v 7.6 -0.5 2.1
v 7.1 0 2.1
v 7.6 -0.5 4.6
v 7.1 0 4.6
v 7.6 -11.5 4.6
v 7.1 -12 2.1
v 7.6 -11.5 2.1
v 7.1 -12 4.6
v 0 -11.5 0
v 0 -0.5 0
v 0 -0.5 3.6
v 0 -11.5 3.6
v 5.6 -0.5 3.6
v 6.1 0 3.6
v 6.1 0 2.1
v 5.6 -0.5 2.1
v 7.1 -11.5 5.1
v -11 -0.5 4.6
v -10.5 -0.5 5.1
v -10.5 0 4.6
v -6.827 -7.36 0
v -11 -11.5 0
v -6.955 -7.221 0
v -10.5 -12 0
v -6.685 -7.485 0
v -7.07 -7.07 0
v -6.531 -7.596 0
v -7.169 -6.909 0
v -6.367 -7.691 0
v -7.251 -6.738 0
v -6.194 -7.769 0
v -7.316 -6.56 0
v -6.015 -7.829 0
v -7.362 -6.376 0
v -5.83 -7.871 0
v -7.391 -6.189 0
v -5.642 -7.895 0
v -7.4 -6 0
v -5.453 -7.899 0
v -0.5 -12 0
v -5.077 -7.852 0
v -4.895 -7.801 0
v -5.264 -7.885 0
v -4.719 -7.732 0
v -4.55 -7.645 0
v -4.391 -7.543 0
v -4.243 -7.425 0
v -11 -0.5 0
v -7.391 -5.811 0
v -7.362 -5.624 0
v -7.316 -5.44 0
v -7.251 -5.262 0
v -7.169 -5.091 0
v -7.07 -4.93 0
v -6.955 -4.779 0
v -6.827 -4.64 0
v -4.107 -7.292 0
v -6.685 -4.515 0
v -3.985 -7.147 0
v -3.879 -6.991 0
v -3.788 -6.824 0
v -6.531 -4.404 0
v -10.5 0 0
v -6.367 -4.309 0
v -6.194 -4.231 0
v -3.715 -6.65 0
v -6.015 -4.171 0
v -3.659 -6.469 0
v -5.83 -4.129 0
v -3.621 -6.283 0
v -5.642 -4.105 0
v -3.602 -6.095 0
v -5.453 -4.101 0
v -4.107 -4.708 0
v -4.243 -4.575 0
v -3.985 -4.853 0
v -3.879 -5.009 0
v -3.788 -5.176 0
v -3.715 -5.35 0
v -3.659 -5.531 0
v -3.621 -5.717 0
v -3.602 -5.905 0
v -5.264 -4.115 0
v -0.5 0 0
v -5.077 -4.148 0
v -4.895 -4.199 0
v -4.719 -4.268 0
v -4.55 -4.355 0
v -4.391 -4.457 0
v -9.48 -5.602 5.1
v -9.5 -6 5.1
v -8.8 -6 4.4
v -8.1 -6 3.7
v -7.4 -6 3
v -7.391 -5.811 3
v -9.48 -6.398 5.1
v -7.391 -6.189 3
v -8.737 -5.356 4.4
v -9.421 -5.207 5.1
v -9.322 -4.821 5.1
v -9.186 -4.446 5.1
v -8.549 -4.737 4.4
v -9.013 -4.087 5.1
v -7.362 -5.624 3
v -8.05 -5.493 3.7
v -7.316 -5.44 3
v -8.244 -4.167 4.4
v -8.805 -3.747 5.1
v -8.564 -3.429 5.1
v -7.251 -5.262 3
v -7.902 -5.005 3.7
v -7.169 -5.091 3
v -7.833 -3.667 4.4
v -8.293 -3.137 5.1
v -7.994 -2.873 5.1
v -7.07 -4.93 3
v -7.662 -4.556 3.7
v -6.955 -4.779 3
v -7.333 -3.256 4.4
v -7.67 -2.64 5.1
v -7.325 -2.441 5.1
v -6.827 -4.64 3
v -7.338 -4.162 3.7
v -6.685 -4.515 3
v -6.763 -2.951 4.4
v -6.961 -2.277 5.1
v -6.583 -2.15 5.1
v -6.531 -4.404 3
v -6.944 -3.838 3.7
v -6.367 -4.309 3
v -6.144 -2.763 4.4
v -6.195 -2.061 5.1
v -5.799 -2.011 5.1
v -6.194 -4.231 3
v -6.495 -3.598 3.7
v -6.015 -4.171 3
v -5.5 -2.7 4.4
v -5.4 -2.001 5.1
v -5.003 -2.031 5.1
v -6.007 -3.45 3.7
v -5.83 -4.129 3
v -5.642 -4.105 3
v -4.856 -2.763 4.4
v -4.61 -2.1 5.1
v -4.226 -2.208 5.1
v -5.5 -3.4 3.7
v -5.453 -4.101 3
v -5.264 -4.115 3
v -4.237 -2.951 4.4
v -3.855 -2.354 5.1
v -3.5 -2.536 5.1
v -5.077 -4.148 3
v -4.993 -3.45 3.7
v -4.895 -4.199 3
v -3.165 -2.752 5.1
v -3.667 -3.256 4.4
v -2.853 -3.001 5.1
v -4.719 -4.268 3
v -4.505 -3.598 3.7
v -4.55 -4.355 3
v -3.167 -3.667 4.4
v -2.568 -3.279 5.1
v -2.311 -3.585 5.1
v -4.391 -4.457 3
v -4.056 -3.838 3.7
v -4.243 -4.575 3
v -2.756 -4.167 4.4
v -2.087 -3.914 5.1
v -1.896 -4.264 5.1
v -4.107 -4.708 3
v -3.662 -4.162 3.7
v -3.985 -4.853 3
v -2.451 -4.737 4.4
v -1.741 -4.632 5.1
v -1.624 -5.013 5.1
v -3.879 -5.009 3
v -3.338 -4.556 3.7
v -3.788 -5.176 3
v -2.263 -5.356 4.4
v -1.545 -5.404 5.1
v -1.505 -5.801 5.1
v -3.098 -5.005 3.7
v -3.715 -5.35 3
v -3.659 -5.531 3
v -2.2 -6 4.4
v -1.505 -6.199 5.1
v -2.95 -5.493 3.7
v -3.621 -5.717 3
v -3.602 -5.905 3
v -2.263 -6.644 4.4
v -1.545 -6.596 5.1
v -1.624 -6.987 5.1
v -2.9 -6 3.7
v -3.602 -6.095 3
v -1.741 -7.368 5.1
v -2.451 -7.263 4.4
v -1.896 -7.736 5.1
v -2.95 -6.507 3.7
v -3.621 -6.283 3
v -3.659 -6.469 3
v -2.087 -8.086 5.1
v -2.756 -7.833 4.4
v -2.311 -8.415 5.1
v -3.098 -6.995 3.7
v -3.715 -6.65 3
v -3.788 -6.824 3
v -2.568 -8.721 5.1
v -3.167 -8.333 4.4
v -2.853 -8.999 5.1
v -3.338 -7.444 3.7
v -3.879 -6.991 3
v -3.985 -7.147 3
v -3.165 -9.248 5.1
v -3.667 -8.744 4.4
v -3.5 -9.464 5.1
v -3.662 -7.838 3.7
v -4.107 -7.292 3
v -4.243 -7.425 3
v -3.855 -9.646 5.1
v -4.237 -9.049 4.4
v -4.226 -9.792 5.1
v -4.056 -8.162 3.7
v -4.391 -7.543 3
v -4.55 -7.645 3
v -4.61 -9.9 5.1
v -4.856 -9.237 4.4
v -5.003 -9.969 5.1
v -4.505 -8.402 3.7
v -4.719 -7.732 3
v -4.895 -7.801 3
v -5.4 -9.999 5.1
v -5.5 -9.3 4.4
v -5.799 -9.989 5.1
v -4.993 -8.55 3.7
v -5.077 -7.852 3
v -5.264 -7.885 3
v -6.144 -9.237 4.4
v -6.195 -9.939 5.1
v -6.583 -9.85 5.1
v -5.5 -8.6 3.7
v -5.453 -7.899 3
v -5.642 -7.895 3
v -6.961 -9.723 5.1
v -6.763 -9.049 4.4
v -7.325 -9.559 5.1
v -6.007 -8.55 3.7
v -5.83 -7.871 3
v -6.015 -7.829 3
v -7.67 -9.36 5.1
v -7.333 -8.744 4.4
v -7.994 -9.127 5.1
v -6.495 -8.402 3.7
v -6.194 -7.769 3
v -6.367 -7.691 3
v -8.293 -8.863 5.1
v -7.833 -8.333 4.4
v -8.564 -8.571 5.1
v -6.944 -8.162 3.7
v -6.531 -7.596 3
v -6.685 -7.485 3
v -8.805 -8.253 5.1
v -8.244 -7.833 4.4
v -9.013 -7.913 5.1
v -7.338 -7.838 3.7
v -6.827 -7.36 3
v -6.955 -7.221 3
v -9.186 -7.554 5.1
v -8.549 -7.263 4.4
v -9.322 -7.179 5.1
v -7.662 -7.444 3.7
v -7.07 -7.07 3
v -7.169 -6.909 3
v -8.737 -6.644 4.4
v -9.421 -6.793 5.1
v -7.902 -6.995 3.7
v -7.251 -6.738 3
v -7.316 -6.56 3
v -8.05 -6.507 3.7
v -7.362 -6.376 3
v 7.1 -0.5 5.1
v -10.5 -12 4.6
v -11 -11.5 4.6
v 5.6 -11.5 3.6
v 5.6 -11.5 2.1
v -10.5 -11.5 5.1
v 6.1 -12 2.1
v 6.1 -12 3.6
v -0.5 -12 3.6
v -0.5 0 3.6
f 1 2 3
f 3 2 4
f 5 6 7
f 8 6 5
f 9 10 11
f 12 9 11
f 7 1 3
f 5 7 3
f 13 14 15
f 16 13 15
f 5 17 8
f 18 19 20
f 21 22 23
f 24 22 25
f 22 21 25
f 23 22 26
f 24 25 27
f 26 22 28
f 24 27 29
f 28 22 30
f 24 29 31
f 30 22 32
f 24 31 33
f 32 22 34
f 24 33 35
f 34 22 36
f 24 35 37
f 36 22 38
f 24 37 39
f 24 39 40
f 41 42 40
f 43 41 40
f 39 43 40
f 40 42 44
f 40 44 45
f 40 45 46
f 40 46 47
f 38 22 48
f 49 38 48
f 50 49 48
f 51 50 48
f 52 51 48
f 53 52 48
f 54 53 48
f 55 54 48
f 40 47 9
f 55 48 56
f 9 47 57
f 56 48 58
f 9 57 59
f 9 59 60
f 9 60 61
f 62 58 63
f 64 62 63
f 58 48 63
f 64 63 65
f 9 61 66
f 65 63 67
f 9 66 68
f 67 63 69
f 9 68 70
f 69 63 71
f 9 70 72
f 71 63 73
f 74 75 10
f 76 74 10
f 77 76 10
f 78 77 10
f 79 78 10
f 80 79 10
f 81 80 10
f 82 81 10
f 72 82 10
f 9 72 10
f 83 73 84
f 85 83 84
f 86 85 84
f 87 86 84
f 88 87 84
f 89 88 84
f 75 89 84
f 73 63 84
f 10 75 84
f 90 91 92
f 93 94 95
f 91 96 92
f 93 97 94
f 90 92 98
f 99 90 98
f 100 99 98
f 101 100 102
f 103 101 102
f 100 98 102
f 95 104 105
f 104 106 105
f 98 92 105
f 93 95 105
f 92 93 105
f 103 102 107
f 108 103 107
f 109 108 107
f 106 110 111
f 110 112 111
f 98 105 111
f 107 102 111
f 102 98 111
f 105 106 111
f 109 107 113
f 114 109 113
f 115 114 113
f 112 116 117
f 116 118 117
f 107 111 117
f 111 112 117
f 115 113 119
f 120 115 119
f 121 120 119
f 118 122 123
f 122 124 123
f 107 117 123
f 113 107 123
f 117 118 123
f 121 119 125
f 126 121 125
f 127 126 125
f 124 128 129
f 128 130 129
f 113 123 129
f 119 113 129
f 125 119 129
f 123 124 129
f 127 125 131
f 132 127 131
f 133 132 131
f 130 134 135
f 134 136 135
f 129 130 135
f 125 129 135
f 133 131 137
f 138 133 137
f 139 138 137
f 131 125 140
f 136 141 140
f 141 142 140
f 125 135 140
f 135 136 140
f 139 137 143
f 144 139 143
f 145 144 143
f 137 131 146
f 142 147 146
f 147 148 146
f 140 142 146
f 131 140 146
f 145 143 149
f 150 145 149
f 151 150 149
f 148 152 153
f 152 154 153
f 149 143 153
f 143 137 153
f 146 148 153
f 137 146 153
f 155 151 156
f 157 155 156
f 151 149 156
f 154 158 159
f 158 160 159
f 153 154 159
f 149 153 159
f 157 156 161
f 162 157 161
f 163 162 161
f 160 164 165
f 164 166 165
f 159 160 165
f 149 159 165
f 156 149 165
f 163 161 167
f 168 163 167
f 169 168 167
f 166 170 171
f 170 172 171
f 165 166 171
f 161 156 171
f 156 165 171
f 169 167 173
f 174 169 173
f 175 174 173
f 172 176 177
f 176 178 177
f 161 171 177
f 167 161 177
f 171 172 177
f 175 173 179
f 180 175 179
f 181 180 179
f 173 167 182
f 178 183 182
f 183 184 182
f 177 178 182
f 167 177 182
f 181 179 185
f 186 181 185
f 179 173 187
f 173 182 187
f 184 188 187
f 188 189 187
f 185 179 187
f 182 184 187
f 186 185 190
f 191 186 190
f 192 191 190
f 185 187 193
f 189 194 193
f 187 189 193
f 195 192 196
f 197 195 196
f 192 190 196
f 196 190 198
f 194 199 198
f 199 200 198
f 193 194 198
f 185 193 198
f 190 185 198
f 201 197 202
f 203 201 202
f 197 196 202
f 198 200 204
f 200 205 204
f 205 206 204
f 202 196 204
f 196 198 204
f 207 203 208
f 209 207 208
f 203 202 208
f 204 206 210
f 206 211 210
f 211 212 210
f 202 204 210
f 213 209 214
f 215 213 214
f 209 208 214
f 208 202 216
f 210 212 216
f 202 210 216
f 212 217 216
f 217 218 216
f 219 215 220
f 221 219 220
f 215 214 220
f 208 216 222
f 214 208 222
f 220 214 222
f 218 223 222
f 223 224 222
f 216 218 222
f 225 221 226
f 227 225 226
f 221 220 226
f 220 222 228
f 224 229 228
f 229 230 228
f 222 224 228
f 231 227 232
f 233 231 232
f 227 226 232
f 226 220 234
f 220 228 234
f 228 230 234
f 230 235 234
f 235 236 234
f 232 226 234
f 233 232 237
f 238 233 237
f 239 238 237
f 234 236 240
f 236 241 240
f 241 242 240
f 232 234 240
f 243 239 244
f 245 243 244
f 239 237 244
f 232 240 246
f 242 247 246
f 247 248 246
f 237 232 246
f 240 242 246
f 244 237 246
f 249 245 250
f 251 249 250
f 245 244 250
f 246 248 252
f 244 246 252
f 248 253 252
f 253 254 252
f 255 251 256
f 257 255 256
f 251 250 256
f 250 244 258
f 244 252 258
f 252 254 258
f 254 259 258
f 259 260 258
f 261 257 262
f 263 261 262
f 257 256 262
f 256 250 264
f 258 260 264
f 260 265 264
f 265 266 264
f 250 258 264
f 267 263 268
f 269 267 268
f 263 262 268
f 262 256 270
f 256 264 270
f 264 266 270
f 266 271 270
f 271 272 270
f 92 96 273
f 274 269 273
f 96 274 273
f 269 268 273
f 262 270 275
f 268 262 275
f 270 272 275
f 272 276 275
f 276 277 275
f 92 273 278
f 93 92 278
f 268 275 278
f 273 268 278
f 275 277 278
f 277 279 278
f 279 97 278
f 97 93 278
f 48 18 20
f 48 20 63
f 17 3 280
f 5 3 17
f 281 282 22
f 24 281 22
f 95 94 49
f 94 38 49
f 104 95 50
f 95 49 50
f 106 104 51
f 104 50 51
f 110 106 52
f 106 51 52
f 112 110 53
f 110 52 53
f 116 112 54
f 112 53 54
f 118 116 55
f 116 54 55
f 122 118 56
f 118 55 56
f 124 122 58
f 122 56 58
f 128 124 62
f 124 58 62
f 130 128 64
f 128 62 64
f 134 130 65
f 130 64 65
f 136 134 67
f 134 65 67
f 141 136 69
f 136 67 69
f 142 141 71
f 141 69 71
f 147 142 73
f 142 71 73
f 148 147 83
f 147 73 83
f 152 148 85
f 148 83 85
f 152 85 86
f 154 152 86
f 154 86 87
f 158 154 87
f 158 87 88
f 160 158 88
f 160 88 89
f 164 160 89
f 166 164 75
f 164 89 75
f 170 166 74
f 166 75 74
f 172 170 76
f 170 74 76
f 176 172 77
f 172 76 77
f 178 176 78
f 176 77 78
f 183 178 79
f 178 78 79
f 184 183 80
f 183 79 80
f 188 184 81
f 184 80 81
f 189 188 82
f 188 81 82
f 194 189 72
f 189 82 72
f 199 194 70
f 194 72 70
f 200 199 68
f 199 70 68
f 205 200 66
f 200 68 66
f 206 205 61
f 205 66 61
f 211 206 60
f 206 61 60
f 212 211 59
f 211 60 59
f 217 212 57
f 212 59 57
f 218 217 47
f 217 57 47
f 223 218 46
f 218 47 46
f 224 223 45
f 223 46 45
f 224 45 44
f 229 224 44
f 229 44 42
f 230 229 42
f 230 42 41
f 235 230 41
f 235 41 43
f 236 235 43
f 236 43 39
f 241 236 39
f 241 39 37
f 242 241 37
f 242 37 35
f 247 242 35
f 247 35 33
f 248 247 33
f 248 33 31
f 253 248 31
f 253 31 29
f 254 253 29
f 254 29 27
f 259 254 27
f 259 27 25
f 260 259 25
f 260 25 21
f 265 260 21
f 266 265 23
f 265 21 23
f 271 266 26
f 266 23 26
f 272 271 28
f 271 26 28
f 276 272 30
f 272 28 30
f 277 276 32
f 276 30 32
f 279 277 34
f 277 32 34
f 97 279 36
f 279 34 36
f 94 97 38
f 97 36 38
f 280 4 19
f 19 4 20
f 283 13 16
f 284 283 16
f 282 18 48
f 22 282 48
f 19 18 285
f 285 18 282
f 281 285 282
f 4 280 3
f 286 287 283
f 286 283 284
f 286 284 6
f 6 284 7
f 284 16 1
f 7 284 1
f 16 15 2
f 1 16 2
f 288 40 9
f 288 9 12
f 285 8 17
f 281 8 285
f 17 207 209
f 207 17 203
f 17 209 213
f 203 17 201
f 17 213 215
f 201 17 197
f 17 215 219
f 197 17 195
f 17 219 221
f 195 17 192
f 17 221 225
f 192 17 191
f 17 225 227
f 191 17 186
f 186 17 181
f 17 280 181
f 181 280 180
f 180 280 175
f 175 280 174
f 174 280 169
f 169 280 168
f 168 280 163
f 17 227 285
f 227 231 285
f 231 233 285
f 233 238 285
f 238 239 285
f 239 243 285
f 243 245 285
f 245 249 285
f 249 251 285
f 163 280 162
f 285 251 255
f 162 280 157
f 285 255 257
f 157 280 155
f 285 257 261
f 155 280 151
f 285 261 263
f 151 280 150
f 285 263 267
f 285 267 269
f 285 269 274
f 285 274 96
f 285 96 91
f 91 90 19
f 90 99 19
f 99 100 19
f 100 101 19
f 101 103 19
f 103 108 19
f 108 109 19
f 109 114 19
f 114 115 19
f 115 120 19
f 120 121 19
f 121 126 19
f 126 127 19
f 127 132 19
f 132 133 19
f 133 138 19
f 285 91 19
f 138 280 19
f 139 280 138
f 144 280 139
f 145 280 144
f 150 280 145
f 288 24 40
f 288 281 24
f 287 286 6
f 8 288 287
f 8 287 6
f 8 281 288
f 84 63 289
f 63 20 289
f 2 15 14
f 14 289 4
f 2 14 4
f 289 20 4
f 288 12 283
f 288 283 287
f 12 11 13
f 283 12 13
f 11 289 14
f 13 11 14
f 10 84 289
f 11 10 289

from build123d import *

# Parameters (mm, degrees)
F1_DEPTH       = 12
F4_D           = 3.8
F4_DEPTH       = 40
F4_CSINK_D     = 8
F4_CSINK_ANGLE = 90
F5_SIZE        = 0.5


with BuildPart() as f1:
    # F0 (on Front) → F1 (new body)
    with BuildSketch(Plane.XZ):
        Polygon((-11, 0), (0, 0), (0, 3.6), (5.6, 3.6), (5.6, 2.1), (7.6, 2.1), (7.6, 5.1), (-11, 5.1), align=None)
    extrude(amount=F1_DEPTH)

    # F4
    with Locations(Plane.XY.offset(5.1)):
        with Locations((-5.5, -6)):
            CounterSinkHole(F4_D / 2, F4_CSINK_D / 2, depth=F4_DEPTH, counter_sink_angle=F4_CSINK_ANGLE)

    # F5
    f5_edges = [f1.edges().sort_by_distance(p)[0] for p in [
        (-1.7, -12, 5.1),
        (7.6, -6, 5.1),
        (-1.7, 0, 5.1),
        (-11, -6, 5.1),
        (-11, -12, 2.55),
        (-11, 0, 2.55),
        (7.6, 0, 3.6),
        (7.6, -12, 3.6),
        (0, -12, 1.8),
        (5.6, -12, 2.85),
        (0, 0, 1.8),
        (5.6, 0, 2.85),
    ]]
    chamfer(f5_edges, length=F5_SIZE)


solid = f1.part
